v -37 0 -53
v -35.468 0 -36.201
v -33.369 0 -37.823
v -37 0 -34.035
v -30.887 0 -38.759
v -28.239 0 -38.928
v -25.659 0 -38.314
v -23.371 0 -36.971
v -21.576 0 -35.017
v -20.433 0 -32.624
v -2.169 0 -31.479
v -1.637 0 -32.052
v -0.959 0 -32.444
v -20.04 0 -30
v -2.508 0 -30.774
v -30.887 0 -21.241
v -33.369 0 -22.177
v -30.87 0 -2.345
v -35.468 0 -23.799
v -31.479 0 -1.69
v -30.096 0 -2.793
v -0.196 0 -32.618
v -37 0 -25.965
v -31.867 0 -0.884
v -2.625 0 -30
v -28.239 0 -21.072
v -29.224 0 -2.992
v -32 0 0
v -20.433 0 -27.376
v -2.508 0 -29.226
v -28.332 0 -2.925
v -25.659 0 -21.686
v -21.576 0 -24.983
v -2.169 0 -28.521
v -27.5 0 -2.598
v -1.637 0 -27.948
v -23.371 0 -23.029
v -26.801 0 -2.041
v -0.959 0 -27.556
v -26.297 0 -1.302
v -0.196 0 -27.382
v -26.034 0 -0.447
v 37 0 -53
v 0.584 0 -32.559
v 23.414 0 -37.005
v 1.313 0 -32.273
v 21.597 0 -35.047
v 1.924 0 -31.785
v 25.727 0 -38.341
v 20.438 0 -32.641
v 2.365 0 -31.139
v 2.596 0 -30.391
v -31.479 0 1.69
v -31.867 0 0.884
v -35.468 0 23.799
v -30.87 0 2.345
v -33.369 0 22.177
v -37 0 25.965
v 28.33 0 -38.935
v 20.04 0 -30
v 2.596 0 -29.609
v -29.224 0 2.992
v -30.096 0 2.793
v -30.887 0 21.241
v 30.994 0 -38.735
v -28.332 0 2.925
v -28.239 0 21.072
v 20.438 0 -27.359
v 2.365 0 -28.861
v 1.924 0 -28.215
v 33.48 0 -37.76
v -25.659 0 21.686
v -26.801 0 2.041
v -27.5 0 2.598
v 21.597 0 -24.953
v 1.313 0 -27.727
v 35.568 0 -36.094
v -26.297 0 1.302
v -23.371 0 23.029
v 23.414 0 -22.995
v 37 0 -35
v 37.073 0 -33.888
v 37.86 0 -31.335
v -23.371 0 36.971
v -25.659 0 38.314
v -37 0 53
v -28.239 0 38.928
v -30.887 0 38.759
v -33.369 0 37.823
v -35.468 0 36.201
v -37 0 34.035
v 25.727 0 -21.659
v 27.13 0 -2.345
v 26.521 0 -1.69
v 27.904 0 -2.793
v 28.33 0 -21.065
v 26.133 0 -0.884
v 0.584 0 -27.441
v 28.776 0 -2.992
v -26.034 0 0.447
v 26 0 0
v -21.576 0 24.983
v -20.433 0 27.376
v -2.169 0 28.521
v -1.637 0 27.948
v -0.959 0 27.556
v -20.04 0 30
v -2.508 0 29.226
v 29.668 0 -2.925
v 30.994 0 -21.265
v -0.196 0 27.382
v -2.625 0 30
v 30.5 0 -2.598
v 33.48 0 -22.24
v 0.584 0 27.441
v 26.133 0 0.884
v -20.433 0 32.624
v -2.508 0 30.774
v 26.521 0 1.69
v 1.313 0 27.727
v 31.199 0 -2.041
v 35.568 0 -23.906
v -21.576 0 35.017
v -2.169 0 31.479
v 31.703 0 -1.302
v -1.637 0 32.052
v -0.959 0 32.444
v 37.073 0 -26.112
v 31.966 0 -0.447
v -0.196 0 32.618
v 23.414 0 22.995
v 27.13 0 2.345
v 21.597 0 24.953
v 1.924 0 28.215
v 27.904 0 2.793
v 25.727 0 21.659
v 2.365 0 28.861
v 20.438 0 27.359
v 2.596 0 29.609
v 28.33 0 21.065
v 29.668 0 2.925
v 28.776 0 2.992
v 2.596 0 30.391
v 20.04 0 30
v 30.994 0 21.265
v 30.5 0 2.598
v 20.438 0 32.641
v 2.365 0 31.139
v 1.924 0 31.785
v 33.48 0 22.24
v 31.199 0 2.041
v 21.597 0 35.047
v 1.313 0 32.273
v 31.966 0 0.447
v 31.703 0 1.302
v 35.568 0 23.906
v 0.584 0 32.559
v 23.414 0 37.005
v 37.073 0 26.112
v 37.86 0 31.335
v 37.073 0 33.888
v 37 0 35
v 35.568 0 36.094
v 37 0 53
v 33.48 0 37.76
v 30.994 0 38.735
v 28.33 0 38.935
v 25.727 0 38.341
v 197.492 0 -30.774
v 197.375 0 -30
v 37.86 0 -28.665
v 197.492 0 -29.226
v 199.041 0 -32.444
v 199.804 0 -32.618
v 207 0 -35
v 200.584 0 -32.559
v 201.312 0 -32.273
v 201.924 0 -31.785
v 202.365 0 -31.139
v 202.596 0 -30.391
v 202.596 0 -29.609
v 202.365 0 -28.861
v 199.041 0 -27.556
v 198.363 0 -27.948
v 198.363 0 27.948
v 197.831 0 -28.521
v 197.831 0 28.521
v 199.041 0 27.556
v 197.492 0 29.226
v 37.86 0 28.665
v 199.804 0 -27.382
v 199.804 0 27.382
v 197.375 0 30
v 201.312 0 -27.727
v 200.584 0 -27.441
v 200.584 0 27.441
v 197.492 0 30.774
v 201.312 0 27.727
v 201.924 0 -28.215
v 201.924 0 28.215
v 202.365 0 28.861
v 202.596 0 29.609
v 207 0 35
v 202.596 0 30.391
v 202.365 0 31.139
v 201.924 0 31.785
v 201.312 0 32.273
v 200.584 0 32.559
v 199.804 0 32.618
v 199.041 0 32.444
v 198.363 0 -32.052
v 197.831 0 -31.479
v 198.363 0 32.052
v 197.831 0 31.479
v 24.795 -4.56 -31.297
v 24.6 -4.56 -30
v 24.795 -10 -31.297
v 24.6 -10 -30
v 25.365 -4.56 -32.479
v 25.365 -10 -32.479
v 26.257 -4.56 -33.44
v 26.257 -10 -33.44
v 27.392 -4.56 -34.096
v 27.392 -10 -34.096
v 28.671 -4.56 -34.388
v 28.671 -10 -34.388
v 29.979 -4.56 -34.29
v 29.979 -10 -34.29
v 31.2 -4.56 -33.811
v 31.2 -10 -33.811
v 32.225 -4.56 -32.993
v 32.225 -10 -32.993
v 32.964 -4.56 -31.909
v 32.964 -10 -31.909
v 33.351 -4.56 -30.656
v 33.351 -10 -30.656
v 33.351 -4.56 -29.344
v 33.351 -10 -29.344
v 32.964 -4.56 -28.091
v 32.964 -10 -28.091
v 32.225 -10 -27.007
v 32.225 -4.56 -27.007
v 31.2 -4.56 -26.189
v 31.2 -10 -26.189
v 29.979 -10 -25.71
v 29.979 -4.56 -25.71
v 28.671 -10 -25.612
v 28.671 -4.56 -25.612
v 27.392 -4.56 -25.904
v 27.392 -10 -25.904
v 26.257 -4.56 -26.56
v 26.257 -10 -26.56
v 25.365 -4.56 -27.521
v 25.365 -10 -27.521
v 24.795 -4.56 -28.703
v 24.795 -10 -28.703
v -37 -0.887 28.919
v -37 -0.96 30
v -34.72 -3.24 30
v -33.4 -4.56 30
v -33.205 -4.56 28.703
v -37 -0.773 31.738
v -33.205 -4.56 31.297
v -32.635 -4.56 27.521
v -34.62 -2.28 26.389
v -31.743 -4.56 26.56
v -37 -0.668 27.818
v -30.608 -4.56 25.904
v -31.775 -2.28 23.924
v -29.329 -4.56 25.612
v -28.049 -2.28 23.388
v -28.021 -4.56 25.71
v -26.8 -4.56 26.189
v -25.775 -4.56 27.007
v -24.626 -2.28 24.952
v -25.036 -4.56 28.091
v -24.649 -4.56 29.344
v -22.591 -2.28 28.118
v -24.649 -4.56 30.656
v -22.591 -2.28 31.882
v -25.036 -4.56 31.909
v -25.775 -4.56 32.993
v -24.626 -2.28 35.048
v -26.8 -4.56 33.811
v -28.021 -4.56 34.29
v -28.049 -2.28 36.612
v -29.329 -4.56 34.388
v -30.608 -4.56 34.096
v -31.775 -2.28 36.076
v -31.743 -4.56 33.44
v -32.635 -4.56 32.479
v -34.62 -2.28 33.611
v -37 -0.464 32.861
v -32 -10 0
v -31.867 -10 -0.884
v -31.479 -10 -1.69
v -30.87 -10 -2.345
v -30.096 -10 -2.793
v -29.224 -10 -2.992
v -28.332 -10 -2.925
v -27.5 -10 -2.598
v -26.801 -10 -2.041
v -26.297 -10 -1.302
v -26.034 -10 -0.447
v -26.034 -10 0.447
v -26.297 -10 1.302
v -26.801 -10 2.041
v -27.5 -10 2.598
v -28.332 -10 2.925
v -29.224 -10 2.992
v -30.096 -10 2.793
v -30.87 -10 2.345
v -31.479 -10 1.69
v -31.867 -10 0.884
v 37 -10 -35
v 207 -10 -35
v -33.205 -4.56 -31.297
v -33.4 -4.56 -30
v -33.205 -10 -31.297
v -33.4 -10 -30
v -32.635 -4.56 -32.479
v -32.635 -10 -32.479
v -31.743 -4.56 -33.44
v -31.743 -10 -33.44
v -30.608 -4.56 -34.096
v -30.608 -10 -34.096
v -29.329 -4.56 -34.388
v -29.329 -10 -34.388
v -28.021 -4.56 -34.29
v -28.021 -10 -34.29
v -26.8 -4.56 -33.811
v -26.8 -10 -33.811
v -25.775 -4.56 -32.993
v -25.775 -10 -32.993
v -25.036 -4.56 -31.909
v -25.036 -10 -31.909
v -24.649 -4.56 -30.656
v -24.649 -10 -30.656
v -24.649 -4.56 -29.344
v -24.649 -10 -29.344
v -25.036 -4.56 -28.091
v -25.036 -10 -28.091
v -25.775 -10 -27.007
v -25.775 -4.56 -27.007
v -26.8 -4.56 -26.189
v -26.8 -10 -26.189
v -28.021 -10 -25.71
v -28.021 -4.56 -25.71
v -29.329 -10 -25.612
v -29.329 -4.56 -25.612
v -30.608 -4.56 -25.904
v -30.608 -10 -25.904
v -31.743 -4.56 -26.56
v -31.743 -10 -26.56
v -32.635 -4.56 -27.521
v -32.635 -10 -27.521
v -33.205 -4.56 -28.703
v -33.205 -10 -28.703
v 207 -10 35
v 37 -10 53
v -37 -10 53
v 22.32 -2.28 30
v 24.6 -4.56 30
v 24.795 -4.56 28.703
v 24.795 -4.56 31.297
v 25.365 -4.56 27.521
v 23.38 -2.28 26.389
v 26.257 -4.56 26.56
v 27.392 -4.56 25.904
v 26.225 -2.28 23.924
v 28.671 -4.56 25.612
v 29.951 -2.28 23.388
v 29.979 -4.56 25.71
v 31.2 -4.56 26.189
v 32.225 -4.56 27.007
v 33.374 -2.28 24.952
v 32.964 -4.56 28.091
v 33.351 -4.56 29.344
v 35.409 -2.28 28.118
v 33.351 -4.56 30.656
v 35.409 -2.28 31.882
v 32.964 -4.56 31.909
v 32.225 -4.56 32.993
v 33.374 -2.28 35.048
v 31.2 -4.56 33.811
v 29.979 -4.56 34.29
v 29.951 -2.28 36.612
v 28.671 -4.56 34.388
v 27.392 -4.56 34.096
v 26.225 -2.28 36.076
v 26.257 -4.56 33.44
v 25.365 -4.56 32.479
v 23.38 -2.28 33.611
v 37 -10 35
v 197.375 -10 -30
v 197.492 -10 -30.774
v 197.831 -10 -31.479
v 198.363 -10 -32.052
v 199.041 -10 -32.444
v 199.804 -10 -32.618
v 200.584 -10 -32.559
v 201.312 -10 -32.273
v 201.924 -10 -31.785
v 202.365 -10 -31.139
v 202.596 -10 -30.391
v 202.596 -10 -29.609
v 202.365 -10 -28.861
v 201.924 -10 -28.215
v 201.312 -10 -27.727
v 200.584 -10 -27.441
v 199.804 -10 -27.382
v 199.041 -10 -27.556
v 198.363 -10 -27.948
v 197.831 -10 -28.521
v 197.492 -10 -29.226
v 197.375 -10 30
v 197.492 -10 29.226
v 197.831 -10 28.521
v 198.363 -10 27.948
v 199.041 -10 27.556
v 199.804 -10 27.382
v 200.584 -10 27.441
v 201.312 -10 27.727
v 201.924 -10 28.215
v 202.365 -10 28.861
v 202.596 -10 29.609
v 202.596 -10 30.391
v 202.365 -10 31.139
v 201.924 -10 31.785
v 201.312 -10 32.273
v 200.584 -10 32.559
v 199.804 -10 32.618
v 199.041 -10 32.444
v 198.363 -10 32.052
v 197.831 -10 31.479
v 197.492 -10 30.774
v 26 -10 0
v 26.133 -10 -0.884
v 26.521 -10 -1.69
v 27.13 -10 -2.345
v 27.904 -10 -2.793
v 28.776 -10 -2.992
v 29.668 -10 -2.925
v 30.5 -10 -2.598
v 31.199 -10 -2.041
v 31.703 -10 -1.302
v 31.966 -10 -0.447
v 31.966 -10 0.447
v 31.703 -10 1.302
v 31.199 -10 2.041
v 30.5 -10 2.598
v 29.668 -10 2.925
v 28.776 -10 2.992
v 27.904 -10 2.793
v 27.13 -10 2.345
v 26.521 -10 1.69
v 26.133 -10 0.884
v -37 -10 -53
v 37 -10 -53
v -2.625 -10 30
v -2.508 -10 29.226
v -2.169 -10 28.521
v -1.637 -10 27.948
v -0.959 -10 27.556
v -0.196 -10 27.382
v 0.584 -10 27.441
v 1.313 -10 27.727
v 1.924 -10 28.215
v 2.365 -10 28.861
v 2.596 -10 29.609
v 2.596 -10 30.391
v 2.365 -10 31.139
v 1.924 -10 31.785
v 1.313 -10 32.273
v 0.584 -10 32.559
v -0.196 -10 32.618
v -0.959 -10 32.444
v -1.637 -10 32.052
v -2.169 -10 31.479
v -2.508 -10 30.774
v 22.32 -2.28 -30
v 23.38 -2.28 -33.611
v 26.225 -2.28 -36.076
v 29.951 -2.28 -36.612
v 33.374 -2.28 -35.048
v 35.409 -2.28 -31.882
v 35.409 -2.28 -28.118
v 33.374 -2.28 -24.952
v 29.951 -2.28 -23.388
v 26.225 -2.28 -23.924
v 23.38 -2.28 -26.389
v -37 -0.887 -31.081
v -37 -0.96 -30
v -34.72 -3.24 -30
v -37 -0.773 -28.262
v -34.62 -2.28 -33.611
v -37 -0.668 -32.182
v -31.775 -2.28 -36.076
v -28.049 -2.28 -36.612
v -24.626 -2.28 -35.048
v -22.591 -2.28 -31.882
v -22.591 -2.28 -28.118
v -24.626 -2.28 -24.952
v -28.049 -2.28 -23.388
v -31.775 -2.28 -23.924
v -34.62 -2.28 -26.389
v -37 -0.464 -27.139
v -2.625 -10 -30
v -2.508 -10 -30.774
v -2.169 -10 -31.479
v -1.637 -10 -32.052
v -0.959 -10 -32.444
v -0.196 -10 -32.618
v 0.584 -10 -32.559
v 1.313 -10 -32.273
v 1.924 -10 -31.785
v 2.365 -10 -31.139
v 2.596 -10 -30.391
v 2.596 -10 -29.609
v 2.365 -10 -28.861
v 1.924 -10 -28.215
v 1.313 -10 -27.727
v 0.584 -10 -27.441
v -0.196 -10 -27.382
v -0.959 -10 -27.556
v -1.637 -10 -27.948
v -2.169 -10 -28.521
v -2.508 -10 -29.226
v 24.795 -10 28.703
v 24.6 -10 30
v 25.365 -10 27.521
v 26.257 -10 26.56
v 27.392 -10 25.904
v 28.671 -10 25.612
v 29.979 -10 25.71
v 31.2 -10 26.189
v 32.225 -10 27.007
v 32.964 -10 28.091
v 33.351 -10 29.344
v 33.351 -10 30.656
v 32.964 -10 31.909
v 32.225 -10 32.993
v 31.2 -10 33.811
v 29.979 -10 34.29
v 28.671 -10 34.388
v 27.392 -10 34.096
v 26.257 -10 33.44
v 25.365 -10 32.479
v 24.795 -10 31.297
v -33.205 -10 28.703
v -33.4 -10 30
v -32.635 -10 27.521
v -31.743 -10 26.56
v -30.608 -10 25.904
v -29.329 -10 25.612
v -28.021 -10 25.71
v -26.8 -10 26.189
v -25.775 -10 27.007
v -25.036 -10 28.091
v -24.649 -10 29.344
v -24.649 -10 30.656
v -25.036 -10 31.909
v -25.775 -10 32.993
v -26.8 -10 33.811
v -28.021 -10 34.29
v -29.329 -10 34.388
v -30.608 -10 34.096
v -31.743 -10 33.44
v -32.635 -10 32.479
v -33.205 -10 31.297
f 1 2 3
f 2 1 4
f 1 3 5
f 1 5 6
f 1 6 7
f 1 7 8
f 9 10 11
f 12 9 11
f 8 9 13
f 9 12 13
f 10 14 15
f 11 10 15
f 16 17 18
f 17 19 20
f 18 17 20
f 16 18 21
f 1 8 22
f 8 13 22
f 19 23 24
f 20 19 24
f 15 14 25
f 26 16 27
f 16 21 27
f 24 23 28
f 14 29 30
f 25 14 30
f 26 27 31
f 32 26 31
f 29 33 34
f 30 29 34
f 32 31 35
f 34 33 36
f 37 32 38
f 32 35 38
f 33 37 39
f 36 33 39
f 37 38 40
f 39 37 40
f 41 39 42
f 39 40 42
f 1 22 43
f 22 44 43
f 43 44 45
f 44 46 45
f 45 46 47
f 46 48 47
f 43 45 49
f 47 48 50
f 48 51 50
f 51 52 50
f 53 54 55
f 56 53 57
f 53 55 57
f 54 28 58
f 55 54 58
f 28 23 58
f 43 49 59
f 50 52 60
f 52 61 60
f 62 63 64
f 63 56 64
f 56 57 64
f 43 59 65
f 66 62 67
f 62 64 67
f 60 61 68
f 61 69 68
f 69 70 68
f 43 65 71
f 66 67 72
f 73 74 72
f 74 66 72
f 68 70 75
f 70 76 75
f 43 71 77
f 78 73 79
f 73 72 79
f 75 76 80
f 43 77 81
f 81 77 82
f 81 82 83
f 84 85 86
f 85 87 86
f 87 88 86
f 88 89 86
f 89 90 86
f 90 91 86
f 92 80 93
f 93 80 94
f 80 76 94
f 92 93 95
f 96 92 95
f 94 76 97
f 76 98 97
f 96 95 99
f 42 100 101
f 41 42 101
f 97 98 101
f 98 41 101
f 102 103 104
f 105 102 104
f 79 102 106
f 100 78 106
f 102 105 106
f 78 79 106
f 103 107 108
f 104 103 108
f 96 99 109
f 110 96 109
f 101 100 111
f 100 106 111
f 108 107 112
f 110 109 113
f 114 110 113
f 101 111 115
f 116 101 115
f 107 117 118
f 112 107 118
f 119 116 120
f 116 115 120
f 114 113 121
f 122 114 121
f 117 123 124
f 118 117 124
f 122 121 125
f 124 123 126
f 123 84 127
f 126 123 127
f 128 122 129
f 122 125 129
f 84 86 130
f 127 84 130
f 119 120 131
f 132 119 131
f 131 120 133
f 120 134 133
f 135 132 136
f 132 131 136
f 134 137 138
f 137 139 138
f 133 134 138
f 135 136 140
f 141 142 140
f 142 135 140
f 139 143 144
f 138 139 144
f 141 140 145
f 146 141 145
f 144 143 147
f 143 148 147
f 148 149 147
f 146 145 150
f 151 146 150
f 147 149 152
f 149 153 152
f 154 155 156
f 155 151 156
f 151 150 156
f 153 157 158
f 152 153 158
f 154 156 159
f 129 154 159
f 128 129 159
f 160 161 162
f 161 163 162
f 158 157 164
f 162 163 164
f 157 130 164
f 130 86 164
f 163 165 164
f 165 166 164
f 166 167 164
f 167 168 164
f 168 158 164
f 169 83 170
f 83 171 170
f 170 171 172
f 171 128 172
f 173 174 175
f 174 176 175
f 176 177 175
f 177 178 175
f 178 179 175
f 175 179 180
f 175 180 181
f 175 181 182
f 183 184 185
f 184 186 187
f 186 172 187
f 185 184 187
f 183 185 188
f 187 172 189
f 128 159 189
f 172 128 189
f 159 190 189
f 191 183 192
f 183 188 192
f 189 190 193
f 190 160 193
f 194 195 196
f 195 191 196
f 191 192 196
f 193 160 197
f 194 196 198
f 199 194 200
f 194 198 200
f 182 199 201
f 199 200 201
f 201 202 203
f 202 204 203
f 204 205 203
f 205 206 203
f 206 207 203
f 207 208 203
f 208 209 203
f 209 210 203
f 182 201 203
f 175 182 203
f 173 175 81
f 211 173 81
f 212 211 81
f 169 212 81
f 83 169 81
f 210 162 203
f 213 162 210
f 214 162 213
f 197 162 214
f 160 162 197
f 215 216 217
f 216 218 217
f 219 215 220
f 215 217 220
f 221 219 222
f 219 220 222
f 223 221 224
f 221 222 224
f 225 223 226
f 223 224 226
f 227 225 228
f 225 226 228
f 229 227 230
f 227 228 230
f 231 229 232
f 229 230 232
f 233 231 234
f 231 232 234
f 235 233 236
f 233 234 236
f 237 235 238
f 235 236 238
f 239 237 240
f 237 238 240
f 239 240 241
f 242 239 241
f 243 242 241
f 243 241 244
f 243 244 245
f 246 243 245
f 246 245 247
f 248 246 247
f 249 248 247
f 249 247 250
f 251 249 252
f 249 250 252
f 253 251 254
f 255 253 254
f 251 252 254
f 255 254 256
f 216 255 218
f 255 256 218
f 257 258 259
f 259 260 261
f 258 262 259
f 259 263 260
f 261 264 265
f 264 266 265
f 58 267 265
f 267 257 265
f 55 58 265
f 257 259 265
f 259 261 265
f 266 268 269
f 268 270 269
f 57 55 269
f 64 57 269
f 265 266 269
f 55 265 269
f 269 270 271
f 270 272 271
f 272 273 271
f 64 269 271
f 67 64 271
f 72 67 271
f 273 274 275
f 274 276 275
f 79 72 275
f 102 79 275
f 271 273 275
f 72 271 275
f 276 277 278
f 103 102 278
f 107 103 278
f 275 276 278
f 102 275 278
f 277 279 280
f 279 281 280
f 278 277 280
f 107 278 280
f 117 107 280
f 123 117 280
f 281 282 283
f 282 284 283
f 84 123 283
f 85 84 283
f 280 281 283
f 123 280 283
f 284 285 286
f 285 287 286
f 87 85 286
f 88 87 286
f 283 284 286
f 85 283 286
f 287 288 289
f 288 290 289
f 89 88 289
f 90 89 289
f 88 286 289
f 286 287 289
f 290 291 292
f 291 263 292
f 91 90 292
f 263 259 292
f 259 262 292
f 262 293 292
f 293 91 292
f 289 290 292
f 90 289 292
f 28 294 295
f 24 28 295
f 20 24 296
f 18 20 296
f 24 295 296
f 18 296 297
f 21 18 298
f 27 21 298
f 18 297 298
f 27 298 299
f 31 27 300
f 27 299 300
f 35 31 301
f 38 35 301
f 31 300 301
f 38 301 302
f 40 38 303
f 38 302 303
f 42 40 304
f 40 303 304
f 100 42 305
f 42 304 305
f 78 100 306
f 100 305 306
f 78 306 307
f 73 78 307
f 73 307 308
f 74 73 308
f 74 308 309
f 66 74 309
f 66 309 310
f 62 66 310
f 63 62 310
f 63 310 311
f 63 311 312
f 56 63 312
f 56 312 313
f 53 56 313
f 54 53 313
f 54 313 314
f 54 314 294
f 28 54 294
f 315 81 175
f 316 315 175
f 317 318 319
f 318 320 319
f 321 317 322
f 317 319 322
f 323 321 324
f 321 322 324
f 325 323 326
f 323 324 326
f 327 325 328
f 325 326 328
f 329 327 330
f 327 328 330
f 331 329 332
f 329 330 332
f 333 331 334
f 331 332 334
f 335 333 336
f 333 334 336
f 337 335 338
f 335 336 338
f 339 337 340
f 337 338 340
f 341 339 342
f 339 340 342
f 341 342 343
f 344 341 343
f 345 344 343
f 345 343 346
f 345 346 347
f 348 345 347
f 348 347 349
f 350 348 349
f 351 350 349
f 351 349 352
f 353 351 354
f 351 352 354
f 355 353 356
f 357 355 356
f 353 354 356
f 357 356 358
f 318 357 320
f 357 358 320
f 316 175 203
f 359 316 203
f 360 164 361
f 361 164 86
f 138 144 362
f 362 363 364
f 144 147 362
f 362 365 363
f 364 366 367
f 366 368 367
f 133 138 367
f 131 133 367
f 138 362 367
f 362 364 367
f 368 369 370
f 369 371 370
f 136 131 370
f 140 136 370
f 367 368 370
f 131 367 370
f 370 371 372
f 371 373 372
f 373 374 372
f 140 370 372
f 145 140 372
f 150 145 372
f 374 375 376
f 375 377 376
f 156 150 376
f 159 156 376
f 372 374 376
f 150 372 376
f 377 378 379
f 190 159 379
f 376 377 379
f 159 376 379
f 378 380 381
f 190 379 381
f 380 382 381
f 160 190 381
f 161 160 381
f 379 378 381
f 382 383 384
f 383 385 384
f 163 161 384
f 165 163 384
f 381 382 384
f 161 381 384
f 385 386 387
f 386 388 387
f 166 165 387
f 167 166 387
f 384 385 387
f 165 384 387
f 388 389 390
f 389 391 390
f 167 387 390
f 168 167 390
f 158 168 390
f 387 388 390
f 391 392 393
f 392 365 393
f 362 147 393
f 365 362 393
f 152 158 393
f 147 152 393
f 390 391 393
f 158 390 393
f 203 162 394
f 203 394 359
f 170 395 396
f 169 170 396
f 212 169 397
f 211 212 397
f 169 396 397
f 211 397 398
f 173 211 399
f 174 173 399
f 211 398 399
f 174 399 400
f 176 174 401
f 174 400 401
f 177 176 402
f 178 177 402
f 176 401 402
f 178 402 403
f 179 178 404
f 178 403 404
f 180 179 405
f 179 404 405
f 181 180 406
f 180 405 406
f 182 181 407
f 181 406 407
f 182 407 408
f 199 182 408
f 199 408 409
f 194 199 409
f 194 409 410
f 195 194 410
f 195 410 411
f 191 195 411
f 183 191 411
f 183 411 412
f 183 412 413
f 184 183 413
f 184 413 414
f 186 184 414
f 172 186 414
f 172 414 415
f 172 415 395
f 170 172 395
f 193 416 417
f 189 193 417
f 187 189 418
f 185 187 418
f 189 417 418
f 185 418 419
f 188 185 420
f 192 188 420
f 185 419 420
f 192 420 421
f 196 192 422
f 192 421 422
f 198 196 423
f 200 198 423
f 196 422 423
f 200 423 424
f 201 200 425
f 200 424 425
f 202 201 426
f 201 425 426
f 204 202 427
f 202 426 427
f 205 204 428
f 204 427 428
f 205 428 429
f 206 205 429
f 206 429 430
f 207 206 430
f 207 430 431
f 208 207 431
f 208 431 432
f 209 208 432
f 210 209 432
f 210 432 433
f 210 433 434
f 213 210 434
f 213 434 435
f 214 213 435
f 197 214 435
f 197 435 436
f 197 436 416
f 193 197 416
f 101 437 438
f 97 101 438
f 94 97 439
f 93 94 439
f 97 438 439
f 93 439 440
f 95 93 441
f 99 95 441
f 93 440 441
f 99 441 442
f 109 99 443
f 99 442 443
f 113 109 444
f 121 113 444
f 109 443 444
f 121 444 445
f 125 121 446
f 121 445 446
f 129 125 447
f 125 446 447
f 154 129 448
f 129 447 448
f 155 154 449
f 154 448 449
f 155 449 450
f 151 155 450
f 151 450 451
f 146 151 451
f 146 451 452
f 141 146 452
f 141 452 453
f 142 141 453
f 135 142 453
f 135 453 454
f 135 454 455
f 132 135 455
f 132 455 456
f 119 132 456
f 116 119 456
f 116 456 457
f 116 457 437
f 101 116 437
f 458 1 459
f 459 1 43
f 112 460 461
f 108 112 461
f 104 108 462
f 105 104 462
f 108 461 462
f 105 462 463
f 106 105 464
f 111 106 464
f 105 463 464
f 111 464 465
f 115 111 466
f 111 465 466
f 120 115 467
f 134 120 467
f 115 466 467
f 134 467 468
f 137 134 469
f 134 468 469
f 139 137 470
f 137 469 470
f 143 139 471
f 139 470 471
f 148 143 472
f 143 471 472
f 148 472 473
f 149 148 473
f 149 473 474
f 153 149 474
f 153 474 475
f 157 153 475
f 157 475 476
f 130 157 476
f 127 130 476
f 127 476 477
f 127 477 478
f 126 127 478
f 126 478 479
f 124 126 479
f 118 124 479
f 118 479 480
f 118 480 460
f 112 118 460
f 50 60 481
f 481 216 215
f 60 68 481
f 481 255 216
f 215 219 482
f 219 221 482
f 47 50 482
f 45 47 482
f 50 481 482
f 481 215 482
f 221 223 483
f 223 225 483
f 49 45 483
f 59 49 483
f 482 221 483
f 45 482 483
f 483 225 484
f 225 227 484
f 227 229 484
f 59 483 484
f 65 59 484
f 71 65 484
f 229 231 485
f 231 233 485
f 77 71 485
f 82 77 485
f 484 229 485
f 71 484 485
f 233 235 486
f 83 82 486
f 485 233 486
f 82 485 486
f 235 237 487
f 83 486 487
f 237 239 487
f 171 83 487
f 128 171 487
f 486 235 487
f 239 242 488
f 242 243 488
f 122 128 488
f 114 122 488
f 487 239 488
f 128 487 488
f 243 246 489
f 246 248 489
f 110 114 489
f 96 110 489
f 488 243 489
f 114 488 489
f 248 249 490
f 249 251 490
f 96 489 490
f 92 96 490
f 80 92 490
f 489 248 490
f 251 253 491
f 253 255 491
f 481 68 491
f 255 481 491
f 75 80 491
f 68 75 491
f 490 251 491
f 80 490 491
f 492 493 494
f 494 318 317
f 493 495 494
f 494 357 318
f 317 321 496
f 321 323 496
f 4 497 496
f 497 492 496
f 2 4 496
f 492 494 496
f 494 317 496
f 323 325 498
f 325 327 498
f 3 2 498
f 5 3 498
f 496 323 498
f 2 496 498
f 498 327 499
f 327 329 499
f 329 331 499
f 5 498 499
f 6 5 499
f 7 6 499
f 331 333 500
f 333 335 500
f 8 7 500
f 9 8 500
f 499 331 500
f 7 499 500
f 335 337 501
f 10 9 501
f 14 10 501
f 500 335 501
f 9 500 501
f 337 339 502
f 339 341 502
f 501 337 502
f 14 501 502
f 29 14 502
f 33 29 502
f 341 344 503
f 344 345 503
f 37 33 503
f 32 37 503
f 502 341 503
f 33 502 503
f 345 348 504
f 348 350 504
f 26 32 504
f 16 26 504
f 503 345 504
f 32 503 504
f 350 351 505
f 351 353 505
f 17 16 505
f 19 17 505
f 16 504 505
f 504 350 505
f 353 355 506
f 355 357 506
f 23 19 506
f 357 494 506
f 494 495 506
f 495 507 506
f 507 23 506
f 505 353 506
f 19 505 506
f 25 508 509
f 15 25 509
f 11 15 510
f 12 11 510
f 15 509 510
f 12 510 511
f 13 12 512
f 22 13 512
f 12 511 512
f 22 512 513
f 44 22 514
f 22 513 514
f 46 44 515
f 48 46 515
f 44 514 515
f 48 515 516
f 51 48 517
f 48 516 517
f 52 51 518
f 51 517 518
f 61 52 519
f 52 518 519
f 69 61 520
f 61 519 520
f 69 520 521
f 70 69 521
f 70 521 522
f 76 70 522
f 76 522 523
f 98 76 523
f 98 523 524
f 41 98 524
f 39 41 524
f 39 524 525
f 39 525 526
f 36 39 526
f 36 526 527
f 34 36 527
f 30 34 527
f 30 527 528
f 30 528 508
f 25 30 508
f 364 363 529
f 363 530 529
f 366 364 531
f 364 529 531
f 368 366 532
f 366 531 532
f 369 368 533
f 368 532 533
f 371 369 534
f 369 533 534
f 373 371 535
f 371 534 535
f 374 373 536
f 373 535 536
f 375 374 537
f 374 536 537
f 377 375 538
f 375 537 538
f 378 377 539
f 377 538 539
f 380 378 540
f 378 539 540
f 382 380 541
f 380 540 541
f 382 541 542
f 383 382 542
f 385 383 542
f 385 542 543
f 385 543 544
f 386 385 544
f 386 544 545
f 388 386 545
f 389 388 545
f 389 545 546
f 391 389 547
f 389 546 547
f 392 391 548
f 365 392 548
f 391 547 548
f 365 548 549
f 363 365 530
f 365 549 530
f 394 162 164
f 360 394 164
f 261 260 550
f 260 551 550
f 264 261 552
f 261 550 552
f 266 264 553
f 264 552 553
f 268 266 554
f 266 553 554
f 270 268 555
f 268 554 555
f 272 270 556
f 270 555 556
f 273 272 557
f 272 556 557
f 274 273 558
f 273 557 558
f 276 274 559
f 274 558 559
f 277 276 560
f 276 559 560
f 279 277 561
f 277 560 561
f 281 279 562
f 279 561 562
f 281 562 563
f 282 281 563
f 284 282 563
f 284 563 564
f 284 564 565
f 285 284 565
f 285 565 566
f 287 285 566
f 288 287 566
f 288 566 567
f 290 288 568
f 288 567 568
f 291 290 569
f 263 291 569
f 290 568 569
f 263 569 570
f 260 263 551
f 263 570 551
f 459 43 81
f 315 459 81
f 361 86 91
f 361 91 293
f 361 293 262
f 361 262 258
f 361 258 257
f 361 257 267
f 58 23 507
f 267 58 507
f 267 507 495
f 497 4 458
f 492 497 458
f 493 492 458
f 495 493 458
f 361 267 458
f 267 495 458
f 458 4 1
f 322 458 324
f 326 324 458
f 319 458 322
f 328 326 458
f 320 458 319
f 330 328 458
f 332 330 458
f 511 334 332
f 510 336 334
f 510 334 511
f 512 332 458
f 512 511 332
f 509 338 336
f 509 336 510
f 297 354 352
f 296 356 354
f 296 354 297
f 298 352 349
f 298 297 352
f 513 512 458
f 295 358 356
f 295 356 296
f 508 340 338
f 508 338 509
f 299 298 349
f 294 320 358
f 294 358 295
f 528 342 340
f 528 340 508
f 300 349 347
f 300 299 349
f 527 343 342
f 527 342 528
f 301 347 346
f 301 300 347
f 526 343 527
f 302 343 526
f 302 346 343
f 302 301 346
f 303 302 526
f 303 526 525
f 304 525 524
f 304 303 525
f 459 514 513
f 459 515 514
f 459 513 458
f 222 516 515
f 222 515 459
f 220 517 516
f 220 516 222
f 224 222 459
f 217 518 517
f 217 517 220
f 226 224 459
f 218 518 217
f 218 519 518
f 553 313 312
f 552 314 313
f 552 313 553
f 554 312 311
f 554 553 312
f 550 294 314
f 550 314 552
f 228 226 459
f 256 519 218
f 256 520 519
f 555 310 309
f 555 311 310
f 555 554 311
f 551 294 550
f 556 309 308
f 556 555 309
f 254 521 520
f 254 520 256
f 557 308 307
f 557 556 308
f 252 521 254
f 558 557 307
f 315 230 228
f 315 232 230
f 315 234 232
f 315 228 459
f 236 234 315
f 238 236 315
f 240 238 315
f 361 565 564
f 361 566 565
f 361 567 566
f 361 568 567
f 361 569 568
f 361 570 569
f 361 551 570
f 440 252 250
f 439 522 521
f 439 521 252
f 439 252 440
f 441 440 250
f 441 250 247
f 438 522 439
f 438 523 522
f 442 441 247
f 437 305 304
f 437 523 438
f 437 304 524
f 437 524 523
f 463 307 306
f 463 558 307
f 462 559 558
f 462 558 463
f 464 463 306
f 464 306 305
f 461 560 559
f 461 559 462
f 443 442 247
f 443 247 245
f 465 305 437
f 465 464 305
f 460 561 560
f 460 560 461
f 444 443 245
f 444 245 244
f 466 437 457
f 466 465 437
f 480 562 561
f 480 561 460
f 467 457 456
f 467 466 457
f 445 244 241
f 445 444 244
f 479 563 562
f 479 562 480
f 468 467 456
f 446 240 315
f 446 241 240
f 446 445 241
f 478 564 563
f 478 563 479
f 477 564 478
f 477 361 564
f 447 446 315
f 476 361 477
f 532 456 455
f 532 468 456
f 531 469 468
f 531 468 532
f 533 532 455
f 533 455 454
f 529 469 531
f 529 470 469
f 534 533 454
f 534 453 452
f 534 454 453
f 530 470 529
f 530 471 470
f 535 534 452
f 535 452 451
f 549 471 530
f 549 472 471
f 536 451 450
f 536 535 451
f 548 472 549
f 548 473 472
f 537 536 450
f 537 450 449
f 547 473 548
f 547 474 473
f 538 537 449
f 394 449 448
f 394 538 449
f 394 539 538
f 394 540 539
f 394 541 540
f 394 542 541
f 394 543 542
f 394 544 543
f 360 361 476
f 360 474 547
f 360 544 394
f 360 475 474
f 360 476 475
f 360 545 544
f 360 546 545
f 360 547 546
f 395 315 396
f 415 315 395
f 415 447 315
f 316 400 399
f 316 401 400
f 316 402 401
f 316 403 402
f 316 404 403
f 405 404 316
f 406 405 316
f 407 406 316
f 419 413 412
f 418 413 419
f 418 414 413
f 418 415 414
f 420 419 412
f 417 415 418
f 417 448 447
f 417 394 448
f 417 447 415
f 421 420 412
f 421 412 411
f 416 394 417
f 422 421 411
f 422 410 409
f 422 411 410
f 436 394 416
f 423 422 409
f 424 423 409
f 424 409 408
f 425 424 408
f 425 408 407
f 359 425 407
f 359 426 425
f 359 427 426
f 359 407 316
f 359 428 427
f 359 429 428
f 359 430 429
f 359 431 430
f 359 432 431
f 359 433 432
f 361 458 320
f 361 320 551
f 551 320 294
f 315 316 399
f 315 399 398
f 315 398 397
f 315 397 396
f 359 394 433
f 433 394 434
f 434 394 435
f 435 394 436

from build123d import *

# Parameters (mm, degrees)
F0_W           = 170
F0_H           = 35
F1_DEPTH       = 10
F2_D           = 6
F2_DEPTH       = 40
F2_TIP         = 1.8025818571
F3_D           = 8.8
F3_DEPTH       = 40
F3_CSINK_D     = 17.92
F3_CSINK_ANGLE = 90
F3_TIP         = 2.6437867237
F5_D           = 5.25
F5_DEPTH       = 40
F5_TIP         = 1.5772591249


with BuildPart() as f1:
    # F0 (on Front) → F1 (new body)
    with BuildSketch(Plane.XZ):
        Polygon((37, 35), (37, 53), (-37, 53), (-37, -53), (37, -53), (37, -35), (37, 0), align=None)
        with Locations((122, -17.5)):
            Rectangle(F0_W, F0_H)
        with Locations((122, 17.5)):
            Rectangle(F0_W, F0_H)
    extrude(amount=F1_DEPTH)

    # F2
    with Locations(Plane(origin=(0, 0, 0), x_dir=(1, 0, 0), z_dir=(0, 1, 0))):
        with Locations((-29, 0), (29, 0)):
            Hole(F2_D / 2, depth=F2_DEPTH)
            with Locations((0, 0, -(F2_DEPTH + F2_TIP / 2))):  # 118° drill point
                Cone(0, F2_D / 2, F2_TIP, mode=Mode.SUBTRACT)

    # F3
    with Locations(Plane(origin=(0, 0, 0), x_dir=(1, 0, 0), z_dir=(0, 1, 0))):
        with Locations((29, 30), (-29, 30), (29, -30), (-29, -30)):
            CounterSinkHole(F3_D / 2, F3_CSINK_D / 2, depth=F3_DEPTH, counter_sink_angle=F3_CSINK_ANGLE)
            with Locations((0, 0, -(F3_DEPTH + F3_TIP / 2))):  # 118° drill point
                Cone(0, F3_D / 2, F3_TIP, mode=Mode.SUBTRACT)

    # F5
    with Locations(Plane(origin=(0, 0, 0), x_dir=(1, 0, 0), z_dir=(0, 1, 0))):
        with Locations((0, 30), (0, -30), (200, 30), (200, -30)):
            Hole(F5_D / 2, depth=F5_DEPTH)
            with Locations((0, 0, -(F5_DEPTH + F5_TIP / 2))):  # 118° drill point
                Cone(0, F5_D / 2, F5_TIP, mode=Mode.SUBTRACT)


solid = f1.part
